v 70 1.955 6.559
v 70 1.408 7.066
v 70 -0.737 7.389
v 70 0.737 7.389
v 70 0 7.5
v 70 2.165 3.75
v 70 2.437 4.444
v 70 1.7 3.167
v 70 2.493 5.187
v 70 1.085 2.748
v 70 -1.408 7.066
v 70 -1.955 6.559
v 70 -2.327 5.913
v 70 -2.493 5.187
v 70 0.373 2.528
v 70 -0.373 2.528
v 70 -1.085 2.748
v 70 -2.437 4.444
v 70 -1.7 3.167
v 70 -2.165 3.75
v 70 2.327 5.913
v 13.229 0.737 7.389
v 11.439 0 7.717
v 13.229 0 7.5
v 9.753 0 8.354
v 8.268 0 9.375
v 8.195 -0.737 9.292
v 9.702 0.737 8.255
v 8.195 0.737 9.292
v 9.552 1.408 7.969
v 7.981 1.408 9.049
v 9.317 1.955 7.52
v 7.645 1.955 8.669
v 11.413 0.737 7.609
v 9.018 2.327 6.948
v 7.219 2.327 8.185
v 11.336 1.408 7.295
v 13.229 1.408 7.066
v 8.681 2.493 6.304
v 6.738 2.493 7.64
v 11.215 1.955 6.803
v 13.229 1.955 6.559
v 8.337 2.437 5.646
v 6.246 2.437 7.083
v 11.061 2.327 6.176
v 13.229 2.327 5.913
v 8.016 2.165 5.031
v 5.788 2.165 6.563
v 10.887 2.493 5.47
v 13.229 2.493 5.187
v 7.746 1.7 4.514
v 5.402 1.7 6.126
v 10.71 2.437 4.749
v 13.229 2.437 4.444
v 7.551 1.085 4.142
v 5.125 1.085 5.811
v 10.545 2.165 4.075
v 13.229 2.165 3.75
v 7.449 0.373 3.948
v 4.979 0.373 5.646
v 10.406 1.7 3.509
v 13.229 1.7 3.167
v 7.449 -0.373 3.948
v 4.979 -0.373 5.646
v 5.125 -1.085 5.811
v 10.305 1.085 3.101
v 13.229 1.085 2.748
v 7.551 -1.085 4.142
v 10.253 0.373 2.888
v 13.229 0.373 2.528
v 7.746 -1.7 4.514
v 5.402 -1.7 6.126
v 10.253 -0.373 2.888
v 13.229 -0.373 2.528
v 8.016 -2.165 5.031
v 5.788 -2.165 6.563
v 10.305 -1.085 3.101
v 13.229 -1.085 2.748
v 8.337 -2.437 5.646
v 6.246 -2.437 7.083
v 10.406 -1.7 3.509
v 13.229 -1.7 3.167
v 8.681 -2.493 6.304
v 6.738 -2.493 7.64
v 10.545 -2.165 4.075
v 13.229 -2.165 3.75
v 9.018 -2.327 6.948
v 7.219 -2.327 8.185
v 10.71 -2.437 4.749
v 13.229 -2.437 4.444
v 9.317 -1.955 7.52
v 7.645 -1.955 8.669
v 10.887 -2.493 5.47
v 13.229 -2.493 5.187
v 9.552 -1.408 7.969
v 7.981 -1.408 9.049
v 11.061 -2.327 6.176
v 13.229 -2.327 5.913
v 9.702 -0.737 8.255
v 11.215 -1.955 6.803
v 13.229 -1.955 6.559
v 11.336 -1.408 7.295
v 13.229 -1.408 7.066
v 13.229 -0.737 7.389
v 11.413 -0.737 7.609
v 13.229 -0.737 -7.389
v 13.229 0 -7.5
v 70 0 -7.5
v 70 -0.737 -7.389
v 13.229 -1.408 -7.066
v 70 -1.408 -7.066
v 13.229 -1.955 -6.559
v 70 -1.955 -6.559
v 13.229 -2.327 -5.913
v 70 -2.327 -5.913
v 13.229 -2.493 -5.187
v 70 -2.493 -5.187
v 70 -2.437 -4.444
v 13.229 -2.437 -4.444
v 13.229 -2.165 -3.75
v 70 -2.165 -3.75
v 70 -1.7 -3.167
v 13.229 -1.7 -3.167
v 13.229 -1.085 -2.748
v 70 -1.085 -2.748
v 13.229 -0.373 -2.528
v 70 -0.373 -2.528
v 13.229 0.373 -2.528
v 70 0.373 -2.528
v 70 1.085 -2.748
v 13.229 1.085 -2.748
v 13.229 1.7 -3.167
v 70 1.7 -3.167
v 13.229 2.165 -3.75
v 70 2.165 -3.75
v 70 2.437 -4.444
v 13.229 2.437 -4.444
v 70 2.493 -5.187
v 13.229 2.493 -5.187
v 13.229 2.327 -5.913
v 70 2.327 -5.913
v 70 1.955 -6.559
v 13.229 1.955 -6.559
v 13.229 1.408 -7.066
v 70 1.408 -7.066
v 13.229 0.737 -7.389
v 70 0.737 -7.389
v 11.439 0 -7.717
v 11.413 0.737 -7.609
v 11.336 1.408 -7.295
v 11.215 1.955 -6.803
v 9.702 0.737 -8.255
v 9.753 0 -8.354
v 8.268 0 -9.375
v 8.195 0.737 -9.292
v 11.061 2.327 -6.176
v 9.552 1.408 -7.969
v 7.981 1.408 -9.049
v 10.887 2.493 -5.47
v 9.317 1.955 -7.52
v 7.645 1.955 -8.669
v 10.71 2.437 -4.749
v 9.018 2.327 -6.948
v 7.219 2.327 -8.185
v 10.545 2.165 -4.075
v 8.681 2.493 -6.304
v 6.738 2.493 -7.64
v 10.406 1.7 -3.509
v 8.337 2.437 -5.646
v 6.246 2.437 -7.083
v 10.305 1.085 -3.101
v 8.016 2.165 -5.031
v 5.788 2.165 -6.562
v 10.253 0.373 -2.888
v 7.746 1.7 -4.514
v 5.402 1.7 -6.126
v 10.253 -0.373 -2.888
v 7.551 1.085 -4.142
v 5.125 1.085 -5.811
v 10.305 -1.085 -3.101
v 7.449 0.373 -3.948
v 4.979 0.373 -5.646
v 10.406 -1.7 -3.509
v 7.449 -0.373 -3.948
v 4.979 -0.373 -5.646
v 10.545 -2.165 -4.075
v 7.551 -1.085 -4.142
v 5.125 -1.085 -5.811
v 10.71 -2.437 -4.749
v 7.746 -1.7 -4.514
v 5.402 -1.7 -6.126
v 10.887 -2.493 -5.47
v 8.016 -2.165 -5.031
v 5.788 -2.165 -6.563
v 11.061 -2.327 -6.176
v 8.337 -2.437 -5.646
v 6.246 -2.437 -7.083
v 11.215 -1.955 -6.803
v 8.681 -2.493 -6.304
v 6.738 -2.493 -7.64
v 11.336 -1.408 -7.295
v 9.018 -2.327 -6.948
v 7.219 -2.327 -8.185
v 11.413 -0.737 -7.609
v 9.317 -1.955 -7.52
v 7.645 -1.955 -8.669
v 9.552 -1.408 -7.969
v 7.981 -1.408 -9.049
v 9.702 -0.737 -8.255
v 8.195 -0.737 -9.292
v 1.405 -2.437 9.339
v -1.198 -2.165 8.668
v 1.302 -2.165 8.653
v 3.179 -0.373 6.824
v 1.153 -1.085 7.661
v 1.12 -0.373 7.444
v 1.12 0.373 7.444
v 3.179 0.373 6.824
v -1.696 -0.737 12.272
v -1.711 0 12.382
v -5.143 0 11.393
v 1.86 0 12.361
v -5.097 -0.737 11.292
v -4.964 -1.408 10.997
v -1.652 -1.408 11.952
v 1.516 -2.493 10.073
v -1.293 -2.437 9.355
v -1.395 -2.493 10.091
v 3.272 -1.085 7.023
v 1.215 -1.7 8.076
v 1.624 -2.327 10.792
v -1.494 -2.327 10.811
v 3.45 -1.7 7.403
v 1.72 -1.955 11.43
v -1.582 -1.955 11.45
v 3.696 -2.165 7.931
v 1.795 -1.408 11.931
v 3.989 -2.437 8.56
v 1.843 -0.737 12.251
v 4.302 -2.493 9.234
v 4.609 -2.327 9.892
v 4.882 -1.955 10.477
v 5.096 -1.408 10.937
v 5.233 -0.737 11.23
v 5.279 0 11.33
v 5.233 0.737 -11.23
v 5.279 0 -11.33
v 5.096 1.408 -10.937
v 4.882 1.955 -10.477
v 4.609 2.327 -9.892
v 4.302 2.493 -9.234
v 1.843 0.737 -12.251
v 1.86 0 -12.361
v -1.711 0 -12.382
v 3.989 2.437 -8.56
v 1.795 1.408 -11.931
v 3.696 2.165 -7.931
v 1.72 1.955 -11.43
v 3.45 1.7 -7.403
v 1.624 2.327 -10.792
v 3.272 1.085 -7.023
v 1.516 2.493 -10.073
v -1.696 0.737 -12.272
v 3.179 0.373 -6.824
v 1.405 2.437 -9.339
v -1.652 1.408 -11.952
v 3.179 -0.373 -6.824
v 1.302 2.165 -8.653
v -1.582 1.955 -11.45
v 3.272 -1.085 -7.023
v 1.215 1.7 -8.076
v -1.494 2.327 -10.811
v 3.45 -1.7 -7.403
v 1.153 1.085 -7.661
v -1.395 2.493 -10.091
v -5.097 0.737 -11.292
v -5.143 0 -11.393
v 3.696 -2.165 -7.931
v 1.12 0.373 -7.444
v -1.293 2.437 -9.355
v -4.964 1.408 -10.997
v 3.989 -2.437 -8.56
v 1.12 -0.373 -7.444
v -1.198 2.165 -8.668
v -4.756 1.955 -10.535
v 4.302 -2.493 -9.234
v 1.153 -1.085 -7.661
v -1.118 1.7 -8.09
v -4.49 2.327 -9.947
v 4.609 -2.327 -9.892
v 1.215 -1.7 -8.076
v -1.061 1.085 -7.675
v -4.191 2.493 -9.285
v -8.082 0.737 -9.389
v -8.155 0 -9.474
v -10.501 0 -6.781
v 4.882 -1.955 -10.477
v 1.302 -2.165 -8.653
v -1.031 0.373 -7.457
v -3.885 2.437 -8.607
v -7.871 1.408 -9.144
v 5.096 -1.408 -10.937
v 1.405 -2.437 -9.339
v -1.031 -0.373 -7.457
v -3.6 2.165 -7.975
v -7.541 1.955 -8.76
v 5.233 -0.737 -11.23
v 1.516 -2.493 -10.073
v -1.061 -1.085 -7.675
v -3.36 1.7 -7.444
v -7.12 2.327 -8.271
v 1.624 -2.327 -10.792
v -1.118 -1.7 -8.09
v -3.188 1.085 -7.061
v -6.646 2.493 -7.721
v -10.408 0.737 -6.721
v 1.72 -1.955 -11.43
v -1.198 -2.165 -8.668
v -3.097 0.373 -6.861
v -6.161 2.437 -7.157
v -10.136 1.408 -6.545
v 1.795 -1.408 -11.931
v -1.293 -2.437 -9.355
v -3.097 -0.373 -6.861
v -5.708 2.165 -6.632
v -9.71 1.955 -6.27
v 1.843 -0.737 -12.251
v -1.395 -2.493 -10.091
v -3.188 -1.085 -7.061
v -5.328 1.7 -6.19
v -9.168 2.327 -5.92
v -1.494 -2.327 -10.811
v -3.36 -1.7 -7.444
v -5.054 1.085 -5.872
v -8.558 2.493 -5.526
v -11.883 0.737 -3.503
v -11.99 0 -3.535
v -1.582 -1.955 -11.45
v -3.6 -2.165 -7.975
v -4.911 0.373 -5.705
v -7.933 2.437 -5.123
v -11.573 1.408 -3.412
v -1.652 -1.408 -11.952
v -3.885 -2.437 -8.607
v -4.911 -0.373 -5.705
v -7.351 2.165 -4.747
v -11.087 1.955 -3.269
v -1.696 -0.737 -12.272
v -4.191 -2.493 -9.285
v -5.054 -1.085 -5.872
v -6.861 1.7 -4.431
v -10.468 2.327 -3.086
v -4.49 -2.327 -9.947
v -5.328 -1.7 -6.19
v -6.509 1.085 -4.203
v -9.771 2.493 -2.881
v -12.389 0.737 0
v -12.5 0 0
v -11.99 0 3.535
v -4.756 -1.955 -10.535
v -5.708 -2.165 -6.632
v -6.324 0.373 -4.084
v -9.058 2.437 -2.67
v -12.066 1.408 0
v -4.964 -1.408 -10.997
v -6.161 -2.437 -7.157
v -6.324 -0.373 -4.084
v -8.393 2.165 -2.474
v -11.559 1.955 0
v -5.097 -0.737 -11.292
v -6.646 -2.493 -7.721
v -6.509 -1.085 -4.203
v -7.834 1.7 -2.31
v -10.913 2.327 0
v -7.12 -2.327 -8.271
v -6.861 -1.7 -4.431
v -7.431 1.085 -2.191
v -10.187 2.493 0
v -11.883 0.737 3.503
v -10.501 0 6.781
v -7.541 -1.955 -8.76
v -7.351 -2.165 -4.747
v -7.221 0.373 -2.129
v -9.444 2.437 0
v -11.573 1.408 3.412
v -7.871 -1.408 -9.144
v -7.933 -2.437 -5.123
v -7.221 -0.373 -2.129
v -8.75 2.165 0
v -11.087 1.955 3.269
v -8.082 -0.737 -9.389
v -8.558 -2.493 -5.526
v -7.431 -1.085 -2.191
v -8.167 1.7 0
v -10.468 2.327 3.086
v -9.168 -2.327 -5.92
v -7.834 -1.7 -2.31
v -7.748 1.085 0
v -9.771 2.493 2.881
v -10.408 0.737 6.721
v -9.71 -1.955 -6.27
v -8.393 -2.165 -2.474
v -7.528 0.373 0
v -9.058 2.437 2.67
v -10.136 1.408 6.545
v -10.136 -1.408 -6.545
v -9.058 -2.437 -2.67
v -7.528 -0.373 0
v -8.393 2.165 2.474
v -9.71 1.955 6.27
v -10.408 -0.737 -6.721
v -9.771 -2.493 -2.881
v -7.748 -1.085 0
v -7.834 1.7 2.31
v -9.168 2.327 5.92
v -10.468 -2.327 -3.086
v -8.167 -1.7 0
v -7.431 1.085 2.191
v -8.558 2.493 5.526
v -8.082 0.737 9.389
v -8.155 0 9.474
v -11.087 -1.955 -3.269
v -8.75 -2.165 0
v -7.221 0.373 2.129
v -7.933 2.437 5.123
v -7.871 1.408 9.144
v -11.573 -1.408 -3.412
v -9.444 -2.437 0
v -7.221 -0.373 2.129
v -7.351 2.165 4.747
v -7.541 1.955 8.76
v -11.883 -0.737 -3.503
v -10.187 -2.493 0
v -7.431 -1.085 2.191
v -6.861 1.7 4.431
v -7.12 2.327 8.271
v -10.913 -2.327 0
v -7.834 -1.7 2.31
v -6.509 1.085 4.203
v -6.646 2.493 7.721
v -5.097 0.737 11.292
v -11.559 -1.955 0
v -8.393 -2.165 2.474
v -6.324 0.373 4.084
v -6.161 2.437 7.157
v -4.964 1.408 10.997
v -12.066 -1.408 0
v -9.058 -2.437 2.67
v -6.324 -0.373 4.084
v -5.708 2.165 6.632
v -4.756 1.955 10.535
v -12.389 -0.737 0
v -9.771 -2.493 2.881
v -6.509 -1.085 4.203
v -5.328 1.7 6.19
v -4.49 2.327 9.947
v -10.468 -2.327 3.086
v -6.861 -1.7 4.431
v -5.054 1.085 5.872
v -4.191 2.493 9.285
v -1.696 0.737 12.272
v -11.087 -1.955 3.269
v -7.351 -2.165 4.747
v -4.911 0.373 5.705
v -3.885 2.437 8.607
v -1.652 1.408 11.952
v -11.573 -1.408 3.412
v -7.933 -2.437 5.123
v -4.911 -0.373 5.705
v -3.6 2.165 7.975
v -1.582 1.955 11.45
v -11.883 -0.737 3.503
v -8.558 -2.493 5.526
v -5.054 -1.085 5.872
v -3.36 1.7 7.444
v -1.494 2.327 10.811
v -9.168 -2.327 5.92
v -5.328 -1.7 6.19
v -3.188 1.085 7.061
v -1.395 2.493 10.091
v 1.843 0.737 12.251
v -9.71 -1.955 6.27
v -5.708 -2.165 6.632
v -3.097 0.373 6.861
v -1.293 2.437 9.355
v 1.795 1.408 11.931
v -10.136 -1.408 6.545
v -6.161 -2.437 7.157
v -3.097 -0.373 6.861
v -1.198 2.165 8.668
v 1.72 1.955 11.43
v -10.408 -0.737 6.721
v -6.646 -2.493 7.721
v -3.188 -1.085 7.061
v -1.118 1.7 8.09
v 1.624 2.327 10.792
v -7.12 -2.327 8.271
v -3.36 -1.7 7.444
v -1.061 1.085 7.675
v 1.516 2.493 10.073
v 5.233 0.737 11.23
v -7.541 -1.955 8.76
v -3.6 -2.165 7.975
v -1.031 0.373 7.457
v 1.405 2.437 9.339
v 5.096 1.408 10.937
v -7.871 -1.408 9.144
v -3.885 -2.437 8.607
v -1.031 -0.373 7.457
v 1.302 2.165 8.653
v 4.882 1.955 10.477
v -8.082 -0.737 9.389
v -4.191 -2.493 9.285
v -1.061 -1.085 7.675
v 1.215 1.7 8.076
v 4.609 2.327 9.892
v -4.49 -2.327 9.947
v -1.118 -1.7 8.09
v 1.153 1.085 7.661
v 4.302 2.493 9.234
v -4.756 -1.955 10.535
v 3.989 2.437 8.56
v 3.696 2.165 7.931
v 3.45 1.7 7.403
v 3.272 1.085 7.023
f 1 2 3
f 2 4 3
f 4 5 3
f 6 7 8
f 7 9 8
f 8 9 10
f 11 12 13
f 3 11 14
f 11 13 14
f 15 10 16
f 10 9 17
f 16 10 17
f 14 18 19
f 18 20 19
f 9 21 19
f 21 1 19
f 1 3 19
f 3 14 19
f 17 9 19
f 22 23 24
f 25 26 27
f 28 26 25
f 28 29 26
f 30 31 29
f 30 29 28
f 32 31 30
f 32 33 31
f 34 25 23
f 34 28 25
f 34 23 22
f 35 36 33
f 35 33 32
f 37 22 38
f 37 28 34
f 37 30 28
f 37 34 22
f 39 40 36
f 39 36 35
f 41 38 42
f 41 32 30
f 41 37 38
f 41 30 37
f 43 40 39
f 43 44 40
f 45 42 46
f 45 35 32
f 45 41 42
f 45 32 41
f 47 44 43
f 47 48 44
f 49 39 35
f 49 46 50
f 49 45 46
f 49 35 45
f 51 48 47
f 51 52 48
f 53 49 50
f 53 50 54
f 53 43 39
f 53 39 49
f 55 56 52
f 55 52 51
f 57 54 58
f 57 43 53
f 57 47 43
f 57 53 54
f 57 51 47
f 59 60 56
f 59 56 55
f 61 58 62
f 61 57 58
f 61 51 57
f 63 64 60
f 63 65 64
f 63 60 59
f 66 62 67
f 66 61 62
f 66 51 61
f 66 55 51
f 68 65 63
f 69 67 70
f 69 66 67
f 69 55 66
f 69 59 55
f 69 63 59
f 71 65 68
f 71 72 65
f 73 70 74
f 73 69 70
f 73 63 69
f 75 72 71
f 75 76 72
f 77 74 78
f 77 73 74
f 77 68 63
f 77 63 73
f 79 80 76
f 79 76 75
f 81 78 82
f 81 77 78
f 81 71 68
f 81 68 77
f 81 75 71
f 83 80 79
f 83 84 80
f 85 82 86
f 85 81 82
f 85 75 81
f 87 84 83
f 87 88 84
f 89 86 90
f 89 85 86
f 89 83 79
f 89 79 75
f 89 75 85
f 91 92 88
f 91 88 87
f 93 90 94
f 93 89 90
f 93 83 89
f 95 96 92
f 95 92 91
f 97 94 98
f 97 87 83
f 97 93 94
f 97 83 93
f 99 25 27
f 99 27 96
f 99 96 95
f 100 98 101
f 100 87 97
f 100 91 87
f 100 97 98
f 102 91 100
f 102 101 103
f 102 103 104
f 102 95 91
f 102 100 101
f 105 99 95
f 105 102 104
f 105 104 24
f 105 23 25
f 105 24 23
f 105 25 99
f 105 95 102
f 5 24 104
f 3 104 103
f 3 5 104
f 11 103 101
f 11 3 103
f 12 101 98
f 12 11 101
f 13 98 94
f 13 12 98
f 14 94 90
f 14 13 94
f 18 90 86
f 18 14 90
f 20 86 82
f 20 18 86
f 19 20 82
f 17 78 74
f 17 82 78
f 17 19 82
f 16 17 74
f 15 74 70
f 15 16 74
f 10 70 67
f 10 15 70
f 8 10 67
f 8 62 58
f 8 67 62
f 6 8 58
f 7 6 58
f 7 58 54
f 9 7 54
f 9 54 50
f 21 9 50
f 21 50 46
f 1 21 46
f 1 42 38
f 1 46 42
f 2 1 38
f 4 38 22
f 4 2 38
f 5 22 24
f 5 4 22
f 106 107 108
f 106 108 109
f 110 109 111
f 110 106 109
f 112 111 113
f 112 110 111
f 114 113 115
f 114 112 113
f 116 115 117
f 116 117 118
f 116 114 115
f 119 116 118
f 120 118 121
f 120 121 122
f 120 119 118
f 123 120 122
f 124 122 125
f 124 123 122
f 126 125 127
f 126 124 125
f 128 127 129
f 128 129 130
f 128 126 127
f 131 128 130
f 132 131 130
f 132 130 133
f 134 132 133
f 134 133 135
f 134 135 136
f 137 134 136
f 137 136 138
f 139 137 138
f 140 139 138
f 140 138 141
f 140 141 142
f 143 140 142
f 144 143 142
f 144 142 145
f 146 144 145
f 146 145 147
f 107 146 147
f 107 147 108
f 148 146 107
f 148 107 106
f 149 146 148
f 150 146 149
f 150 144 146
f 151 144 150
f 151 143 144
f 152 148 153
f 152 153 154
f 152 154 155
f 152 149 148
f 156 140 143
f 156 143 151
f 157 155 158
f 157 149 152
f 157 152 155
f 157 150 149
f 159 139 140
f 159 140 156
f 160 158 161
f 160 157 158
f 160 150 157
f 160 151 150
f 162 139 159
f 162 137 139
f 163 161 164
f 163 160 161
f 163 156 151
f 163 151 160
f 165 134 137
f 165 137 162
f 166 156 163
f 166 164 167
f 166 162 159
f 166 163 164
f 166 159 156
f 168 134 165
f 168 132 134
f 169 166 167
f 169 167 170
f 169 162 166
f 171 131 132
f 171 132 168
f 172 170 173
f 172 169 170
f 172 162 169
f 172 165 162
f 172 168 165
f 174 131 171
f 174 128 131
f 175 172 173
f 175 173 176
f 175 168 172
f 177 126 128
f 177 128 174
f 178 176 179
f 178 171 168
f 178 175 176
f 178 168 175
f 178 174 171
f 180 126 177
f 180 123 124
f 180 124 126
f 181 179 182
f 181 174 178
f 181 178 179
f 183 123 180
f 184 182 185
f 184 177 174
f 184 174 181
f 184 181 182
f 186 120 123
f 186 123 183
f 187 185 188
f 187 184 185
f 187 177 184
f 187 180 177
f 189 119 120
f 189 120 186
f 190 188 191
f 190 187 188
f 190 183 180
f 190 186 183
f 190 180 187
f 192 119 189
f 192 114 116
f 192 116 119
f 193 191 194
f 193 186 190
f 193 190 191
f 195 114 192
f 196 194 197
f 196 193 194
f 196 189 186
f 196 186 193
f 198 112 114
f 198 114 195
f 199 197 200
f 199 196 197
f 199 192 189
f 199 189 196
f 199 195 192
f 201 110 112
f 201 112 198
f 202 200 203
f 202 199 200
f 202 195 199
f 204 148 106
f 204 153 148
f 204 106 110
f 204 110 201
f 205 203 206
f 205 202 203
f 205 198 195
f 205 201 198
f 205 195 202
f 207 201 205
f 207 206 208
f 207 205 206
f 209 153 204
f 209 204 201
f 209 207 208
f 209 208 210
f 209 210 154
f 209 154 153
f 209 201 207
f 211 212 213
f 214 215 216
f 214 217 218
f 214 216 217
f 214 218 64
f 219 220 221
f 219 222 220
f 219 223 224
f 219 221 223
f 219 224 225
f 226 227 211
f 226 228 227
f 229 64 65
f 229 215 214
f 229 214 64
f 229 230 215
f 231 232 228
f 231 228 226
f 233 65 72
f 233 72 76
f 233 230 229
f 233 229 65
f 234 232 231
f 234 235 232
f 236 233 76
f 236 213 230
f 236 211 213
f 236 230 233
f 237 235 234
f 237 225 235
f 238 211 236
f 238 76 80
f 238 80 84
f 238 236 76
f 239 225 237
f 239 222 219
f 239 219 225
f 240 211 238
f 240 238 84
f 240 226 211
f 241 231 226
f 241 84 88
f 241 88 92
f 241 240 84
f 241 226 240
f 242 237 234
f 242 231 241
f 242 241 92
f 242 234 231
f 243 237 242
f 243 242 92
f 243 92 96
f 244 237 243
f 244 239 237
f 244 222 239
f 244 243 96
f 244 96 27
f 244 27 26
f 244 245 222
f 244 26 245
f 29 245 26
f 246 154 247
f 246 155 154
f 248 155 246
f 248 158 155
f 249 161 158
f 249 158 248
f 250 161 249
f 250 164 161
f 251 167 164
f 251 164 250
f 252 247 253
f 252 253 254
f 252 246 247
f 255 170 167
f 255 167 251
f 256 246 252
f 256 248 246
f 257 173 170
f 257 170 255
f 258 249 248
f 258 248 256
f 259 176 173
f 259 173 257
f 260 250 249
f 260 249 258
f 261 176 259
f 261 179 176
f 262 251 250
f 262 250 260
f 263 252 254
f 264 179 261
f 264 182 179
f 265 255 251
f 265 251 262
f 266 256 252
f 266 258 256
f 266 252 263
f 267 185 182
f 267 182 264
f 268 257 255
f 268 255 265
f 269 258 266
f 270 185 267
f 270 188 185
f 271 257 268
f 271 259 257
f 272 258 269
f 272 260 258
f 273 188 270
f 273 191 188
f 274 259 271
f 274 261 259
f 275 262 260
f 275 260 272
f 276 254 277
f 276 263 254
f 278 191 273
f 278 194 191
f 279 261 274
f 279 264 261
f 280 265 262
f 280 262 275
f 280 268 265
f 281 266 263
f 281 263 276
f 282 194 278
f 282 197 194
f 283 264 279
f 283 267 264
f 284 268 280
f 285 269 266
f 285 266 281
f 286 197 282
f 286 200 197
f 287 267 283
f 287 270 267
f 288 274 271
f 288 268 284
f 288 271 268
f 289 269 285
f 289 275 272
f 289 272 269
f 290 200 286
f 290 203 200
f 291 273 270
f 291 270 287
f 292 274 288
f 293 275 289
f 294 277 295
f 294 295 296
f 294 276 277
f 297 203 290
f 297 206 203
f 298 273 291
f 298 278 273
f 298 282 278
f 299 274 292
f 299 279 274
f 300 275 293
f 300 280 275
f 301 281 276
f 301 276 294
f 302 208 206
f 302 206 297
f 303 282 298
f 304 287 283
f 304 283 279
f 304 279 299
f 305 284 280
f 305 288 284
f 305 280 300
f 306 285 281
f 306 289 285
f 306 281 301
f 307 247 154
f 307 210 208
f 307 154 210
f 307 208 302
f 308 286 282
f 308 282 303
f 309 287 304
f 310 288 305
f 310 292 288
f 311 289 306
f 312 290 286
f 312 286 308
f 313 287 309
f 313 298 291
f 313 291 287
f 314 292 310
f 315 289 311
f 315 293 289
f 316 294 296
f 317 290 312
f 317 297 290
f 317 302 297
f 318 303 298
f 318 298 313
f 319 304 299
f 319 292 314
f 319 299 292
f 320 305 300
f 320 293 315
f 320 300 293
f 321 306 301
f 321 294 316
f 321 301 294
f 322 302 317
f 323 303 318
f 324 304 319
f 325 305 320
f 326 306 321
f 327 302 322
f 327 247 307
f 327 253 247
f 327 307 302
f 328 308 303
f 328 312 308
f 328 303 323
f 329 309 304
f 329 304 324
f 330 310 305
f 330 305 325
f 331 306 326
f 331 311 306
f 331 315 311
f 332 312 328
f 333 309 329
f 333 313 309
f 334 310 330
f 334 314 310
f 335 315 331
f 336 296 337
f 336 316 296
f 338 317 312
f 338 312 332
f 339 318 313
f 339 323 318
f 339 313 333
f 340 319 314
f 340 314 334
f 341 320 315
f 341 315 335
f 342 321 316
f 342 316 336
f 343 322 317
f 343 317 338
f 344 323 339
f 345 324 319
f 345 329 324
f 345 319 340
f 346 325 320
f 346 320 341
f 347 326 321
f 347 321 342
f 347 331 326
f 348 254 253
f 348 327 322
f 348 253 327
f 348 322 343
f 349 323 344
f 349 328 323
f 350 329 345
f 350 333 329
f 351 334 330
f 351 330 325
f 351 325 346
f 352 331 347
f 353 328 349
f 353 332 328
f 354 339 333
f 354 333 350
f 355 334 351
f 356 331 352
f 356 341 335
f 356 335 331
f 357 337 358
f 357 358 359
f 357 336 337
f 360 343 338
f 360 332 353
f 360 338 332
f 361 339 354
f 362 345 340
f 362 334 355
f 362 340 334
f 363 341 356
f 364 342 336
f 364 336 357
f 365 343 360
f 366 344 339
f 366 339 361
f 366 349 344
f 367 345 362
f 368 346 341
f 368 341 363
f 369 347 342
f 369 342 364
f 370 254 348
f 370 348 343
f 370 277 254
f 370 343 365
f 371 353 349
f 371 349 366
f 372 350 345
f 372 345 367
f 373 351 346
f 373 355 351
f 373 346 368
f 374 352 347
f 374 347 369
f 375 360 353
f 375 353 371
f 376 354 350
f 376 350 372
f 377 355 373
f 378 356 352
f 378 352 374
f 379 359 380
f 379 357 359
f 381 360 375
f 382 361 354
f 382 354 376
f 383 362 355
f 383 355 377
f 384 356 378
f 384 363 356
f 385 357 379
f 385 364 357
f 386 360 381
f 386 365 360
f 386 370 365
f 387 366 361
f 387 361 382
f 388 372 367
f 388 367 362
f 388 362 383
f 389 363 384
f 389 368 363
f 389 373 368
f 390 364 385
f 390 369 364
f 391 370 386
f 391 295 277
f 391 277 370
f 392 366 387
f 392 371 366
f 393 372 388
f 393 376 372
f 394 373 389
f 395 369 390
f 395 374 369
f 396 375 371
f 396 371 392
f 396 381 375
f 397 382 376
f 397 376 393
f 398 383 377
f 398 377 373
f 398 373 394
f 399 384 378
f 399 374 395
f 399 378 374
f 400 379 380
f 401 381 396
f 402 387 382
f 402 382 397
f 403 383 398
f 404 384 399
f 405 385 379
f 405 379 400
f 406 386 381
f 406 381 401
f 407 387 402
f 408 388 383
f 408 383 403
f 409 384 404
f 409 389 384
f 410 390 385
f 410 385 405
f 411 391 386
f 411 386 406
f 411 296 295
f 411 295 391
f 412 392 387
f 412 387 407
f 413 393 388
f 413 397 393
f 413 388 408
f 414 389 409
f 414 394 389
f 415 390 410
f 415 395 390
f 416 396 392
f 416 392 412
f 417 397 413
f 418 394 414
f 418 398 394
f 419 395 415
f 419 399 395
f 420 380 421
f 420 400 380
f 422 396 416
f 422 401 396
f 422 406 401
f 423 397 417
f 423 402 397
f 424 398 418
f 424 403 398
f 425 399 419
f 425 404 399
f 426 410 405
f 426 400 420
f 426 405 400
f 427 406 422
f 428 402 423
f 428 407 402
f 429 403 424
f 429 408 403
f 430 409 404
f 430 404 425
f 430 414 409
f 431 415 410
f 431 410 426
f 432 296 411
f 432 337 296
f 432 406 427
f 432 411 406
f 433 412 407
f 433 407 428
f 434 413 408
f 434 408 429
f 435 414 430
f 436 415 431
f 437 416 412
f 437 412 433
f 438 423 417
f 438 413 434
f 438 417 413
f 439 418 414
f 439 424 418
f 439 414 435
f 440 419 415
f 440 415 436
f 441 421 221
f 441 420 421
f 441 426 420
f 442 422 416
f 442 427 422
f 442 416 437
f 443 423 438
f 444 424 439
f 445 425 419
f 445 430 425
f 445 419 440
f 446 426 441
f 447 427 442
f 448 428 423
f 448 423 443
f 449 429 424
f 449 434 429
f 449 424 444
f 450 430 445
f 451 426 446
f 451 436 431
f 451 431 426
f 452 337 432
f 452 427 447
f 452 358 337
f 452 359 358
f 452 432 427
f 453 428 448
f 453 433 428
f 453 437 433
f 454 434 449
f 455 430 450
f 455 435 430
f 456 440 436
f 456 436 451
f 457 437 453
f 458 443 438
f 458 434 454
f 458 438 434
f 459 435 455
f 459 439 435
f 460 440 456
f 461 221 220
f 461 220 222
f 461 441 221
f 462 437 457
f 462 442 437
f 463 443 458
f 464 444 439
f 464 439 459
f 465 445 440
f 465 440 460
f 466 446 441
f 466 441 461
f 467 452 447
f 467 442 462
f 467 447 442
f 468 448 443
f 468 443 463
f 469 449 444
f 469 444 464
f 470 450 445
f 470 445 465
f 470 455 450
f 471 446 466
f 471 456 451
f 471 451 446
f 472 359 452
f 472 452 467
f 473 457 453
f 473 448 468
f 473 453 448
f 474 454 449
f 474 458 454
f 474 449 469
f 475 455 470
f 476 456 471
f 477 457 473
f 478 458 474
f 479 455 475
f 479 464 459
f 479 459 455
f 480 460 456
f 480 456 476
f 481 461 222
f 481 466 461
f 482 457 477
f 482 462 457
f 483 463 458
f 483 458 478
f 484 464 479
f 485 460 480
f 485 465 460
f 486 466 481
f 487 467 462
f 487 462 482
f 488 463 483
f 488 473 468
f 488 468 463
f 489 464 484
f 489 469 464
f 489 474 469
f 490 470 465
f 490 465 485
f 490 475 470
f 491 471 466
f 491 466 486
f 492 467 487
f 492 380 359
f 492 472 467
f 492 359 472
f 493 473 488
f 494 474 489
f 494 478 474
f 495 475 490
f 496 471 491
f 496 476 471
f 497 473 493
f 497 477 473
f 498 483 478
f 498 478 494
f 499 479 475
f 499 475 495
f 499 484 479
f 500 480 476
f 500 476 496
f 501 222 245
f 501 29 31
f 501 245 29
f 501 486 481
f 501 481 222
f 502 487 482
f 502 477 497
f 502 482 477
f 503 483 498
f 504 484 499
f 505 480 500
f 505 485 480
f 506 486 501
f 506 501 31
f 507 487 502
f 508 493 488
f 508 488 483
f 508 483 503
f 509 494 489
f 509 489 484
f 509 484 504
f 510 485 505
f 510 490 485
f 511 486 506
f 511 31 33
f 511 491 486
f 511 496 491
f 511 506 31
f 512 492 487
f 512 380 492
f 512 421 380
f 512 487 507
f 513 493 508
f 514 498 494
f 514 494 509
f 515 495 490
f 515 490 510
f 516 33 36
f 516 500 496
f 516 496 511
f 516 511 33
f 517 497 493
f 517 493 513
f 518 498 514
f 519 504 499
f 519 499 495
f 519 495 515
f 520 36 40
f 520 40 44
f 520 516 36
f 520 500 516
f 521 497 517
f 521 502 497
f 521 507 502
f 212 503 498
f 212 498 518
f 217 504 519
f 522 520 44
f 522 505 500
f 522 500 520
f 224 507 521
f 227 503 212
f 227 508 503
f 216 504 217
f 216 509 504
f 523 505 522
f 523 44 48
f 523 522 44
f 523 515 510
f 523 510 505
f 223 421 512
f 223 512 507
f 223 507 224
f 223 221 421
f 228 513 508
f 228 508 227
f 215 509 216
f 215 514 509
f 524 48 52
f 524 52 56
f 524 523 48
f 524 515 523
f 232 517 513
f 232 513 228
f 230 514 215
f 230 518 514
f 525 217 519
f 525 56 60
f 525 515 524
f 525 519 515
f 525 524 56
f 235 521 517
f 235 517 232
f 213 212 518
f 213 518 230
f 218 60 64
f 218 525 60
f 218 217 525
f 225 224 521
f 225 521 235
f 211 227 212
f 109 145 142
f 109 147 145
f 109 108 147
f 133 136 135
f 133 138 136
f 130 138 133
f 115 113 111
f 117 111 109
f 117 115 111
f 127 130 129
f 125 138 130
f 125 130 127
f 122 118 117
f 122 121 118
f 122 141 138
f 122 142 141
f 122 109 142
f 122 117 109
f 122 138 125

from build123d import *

# Parameters (mm, degrees)
SKETCH_3_R = 2.5


with BuildPart() as part:
    # 扫描2: sweep along a path in 草图1
    with BuildLine(Plane(origin=(0, 0, 0), x_dir=(1, 0, 0), z_dir=(0, 1, 0))) as sweep_2_path:
        Line((70, 5), (13.228756555, 5))
        ThreePointArc((13.228756555, 5), (9.693222649, 5.645856533), (6.614378278, 7.5))
        ThreePointArc((6.614378278, 7.5), (-10, 0), (6.614378278, -7.5))
        ThreePointArc((6.614378278, -7.5), (9.693222649, -5.645856533), (13.228756555, -5))
        Line((13.228756555, -5), (70, -5))
    # 草图3 → 扫描2 (sweep)
    with BuildSketch(Plane(origin=(70, 0, 0), x_dir=(0, 0, -1), z_dir=(1, 0, 0))):
        with Locations((5, 0)):
            Circle(SKETCH_3_R)
    sweep(path=sweep_2_path.line)


solid = part.part
